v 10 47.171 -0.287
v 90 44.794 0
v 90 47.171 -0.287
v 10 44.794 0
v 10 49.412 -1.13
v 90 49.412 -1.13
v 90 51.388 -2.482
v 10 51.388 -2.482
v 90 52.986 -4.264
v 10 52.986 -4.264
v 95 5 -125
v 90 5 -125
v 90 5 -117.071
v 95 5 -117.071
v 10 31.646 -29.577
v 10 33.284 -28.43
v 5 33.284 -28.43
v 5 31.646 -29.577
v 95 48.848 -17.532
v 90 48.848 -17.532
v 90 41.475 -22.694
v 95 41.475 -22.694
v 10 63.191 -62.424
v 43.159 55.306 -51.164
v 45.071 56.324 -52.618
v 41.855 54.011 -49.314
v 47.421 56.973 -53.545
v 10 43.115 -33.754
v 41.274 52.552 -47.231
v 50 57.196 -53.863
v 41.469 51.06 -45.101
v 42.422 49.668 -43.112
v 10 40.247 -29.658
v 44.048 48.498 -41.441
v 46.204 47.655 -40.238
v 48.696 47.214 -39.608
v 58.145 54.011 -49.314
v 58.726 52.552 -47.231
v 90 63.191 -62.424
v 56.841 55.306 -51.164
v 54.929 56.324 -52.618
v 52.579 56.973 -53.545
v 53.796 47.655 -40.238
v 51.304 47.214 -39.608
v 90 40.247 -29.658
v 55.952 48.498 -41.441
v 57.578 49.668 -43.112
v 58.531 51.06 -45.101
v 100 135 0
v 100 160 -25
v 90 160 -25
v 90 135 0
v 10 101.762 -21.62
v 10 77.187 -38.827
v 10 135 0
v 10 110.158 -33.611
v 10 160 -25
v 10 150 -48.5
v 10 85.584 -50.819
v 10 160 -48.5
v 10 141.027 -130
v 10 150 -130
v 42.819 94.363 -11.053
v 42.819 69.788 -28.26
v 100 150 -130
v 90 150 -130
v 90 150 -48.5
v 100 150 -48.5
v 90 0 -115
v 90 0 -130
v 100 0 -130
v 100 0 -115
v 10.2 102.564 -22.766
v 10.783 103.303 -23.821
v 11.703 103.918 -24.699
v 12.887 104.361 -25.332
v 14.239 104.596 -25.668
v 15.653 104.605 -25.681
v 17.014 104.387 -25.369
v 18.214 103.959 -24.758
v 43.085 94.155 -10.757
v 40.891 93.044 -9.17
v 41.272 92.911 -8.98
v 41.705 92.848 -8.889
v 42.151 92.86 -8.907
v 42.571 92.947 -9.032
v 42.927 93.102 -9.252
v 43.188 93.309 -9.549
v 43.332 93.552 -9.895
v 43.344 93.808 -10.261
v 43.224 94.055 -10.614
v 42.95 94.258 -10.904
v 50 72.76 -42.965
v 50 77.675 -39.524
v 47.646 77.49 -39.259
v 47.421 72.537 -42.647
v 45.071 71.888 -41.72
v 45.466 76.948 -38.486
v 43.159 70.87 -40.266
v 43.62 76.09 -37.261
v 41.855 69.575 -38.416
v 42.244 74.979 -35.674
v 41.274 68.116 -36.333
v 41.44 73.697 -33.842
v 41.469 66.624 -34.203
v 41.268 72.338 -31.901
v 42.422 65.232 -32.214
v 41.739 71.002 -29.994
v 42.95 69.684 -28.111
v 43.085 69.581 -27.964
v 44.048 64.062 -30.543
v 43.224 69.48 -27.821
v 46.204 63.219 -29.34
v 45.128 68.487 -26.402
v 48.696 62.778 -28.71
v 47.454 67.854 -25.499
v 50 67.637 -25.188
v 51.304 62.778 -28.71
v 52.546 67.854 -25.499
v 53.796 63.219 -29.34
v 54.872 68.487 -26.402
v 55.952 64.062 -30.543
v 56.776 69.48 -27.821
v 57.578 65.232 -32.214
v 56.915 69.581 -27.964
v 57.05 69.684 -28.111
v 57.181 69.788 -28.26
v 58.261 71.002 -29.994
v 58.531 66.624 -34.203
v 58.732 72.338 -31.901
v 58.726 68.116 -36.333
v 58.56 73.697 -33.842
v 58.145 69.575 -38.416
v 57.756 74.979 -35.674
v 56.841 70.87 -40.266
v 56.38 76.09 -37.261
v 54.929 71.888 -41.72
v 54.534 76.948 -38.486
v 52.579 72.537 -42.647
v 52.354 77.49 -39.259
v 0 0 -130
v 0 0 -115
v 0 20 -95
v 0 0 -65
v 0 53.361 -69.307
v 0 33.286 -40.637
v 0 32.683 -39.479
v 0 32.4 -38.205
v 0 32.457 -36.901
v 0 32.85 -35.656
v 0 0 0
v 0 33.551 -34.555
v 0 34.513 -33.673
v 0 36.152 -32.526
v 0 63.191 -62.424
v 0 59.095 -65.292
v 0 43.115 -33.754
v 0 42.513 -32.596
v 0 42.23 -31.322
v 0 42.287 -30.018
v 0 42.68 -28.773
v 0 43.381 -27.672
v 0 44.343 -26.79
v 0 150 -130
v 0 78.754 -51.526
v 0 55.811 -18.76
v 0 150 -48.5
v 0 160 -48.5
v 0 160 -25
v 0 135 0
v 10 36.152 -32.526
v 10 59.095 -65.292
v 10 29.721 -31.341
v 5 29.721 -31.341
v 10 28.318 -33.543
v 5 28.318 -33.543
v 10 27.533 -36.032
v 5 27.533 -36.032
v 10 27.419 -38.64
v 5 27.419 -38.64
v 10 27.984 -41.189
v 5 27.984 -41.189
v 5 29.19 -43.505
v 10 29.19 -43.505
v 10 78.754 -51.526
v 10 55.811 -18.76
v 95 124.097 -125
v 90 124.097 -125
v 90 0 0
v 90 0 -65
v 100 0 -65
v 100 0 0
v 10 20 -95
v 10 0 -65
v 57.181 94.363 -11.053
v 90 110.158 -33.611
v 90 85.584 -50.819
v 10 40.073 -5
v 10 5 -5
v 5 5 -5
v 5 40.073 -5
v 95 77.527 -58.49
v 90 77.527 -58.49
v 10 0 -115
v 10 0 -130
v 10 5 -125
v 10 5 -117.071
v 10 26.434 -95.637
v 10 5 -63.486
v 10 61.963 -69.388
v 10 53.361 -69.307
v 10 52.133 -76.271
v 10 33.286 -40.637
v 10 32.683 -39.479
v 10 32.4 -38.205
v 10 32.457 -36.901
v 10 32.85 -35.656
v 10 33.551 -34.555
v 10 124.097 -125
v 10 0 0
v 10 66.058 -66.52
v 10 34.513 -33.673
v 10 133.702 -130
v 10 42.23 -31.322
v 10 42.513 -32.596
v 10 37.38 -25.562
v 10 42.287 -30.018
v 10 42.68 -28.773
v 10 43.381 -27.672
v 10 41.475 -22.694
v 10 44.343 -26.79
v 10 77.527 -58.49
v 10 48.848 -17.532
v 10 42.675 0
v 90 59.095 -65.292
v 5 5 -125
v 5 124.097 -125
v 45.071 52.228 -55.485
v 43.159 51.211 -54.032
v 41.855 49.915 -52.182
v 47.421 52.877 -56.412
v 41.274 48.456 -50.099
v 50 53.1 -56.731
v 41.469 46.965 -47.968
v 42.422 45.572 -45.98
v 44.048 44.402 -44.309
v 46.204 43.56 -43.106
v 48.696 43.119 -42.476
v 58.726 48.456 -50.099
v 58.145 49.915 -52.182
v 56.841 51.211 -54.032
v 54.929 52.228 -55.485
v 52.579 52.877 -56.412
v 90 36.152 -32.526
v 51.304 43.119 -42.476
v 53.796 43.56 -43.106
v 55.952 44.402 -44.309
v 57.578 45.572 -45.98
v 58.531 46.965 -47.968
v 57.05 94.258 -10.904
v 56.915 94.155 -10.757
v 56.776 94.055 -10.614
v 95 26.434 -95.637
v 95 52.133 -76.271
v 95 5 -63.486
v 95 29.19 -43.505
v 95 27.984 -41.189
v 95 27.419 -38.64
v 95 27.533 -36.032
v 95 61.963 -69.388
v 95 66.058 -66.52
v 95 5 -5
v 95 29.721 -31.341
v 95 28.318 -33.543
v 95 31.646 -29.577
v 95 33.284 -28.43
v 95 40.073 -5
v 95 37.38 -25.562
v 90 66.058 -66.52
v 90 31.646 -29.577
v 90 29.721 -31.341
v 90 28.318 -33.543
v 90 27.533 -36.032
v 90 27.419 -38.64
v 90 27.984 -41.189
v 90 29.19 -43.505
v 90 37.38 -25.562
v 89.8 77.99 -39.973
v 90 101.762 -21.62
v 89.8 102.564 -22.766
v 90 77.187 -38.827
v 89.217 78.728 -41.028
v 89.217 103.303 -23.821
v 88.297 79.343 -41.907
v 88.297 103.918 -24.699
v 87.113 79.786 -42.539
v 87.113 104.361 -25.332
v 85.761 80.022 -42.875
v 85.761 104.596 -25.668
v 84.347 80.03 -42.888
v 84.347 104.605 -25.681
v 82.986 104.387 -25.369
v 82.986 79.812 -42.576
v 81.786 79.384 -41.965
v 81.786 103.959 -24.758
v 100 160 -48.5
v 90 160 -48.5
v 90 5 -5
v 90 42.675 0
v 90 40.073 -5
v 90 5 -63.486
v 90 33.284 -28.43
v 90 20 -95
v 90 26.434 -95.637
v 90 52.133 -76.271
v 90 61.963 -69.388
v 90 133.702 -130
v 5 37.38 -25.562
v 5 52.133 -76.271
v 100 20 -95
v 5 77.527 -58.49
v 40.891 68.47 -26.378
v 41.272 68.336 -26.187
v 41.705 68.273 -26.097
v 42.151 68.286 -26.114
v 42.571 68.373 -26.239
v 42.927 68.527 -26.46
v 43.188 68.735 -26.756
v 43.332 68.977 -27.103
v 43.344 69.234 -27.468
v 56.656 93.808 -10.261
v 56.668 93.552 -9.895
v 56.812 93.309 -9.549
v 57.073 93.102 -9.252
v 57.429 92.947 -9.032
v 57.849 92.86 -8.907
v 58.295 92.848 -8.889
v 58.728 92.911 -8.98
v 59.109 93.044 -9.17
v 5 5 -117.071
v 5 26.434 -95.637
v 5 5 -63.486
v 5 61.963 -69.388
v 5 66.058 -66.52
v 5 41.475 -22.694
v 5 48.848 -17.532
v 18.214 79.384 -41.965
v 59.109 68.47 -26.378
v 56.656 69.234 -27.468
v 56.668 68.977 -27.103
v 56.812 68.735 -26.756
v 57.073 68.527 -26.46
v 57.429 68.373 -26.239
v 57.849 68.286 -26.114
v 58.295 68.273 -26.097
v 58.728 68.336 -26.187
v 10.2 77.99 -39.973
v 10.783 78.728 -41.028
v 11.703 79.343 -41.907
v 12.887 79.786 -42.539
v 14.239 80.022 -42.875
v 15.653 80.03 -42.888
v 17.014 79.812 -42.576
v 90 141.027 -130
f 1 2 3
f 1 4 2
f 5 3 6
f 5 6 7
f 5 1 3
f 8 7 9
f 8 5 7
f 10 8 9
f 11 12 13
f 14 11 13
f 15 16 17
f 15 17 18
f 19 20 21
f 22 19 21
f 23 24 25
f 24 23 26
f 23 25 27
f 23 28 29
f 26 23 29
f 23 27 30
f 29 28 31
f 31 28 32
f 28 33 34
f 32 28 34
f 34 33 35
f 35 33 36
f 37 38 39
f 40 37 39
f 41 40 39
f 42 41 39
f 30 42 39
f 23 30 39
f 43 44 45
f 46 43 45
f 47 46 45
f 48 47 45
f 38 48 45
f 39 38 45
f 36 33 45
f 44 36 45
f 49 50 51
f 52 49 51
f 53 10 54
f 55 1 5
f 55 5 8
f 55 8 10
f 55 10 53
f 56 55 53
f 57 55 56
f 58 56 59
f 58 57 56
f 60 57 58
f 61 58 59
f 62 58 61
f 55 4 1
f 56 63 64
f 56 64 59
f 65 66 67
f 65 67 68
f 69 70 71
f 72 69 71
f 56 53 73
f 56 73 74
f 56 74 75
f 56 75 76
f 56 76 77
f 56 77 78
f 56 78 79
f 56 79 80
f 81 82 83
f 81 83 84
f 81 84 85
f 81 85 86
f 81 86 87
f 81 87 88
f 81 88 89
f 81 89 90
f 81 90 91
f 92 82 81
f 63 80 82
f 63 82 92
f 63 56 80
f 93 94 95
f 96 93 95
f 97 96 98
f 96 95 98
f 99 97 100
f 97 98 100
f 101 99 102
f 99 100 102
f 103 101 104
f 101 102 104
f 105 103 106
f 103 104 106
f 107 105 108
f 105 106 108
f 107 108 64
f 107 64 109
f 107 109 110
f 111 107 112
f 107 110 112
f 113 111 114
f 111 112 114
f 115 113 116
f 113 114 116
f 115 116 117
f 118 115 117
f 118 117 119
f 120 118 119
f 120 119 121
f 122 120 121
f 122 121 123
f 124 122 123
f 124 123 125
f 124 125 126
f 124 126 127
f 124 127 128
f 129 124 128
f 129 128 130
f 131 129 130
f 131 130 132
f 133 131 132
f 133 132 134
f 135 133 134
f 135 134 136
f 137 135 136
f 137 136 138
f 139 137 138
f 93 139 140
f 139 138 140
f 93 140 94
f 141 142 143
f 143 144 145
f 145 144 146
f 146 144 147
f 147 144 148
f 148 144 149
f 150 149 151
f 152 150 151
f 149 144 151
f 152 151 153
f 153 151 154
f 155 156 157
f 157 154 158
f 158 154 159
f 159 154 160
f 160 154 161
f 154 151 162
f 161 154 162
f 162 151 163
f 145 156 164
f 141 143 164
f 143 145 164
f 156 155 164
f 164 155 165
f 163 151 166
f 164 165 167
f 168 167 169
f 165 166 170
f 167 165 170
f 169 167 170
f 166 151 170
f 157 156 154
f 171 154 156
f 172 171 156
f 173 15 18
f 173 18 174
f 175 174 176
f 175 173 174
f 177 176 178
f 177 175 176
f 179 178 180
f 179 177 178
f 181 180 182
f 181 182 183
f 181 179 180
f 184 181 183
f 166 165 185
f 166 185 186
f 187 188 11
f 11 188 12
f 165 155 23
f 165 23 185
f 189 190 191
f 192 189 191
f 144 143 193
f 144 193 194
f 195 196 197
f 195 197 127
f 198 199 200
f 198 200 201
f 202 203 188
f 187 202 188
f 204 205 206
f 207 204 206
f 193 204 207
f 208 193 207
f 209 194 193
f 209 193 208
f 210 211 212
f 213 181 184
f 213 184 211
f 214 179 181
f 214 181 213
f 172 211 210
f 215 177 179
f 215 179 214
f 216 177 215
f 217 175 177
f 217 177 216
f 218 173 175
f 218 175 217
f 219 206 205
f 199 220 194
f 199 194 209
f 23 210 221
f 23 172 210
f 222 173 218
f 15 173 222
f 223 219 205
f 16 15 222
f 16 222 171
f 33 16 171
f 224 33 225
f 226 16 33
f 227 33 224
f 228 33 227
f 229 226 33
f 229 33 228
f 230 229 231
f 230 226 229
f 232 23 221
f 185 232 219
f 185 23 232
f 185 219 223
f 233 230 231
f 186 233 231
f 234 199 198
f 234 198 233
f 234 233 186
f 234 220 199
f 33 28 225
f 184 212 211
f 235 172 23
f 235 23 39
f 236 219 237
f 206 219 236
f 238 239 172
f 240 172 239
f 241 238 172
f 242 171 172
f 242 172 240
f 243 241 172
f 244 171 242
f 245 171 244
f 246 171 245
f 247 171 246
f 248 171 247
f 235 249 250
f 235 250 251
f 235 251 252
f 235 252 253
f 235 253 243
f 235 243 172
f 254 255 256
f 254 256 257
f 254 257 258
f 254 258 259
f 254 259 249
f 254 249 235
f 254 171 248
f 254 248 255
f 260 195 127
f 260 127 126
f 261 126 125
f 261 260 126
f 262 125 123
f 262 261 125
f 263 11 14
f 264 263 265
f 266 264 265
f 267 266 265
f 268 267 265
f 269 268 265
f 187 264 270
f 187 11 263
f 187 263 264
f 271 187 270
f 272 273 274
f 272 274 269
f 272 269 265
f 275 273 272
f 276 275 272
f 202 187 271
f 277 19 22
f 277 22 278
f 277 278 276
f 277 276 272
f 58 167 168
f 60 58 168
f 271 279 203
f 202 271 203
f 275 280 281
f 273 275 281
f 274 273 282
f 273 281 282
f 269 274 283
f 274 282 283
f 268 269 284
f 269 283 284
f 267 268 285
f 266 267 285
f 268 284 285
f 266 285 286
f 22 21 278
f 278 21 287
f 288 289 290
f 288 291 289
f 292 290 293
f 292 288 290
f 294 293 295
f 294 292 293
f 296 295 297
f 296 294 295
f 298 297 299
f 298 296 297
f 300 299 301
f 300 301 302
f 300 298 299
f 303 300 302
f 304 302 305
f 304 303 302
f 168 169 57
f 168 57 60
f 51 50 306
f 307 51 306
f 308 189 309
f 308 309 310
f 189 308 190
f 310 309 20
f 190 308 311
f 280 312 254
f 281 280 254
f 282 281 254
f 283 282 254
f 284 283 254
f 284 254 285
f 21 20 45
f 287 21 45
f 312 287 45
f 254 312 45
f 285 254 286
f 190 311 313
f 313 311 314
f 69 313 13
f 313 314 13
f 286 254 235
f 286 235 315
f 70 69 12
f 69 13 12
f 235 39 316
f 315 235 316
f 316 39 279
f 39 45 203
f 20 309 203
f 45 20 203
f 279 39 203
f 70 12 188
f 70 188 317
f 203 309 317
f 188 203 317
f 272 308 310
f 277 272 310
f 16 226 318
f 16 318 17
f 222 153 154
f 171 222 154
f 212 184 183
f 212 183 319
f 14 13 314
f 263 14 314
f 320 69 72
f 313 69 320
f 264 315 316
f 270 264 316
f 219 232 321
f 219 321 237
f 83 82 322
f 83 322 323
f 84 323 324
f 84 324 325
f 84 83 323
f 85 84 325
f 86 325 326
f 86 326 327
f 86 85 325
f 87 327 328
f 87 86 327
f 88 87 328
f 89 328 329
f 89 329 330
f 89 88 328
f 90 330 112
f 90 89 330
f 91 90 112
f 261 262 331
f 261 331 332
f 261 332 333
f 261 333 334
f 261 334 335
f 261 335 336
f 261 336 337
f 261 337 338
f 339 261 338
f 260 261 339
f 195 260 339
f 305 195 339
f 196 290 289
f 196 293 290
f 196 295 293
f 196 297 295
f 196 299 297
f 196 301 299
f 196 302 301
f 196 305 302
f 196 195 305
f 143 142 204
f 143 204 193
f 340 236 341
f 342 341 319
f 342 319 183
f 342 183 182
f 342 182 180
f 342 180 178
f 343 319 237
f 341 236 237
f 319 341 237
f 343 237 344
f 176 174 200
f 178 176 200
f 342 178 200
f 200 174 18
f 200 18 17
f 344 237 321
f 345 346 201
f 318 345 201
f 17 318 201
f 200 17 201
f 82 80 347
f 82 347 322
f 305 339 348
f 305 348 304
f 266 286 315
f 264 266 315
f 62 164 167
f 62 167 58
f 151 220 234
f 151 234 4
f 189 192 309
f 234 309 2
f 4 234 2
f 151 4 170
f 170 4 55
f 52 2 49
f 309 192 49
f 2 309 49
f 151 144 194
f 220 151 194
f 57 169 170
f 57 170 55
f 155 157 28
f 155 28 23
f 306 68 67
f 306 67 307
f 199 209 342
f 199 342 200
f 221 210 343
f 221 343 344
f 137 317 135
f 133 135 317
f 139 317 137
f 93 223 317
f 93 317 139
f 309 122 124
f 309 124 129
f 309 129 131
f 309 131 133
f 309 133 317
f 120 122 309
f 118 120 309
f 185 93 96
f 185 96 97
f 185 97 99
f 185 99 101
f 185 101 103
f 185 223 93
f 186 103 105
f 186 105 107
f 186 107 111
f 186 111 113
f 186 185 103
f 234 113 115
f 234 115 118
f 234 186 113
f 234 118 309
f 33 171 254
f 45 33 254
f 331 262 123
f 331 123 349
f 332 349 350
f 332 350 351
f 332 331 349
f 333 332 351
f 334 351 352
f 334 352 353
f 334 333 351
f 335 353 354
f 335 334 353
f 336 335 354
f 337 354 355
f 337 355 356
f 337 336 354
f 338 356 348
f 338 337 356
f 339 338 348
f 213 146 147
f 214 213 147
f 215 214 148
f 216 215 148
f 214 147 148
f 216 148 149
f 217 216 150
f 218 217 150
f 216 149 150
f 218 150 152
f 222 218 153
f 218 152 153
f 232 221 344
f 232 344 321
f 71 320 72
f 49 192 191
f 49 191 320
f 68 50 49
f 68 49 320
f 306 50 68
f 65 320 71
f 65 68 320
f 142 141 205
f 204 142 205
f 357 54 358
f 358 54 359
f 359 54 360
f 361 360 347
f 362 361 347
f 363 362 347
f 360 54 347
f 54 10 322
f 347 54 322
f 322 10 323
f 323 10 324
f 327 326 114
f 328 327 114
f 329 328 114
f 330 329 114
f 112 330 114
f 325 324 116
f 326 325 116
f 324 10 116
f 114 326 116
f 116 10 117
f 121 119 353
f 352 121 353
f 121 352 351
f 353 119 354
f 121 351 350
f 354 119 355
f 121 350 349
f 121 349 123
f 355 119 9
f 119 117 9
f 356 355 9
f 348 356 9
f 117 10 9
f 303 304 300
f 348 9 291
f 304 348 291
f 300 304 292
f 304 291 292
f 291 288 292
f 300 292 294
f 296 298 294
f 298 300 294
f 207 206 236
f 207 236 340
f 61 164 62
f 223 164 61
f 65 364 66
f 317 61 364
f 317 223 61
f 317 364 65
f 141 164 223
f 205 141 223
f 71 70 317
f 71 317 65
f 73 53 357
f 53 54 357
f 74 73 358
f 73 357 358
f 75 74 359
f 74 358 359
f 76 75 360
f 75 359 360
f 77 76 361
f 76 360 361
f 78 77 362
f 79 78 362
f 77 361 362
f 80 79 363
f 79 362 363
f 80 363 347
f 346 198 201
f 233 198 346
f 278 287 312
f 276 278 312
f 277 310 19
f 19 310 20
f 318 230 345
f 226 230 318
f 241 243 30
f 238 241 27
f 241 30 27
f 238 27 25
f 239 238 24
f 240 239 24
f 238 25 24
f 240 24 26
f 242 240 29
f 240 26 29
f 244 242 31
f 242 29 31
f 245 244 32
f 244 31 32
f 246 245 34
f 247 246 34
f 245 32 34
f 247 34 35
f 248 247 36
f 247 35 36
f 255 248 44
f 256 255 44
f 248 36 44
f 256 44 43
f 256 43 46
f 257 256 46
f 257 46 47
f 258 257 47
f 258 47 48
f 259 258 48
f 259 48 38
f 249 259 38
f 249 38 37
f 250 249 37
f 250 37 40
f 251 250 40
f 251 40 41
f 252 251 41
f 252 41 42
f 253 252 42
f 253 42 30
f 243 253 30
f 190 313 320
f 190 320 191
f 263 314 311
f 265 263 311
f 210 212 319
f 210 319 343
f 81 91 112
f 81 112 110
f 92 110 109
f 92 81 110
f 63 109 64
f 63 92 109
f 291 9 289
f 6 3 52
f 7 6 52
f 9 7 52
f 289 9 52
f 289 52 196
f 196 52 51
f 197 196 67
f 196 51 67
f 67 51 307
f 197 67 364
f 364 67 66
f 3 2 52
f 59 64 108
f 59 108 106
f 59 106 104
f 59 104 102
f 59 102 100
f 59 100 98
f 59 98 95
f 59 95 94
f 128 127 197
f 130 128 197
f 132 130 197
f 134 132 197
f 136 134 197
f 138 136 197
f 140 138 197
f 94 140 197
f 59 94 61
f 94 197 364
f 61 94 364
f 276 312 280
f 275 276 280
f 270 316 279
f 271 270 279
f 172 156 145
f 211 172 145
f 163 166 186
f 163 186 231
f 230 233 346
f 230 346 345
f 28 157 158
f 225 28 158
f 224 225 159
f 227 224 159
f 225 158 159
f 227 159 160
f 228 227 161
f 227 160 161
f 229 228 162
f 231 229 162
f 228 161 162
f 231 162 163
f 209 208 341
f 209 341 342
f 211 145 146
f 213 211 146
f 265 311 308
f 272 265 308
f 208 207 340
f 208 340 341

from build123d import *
from build123d.topology import SkipClean

# Parameters (mm, degrees)
SKETCH5_W           = 100
SKETCH5_H           = 130
BOSS_EXTRUDE1_DEPTH = 150
CUT_EXTRUDE1_START  = -50
CUT_EXTRUDE1_DEPTH  = 40
BOSS_EXTRUDE3_START = 30
SKETCH17_W          = 80
SKETCH17_H          = 40
BOSS_EXTRUDE3_DEPTH = 5
SKETCH10_R          = 8.75
CUT_EXTRUDE3_DEPTH  = 100
SKETCH18_W          = 48.5
SKETCH18_H          = 10
BOSS_EXTRUDE4_DEPTH = 10
BOSS_EXTRUDE5_START = 100
SKETCH18_2_W        = 48.5
SKETCH18_2_H        = 10
BOSS_EXTRUDE5_DEPTH = 10
CUT_EXTRUDE5_DEPTH  = 70
FILLET1_DEPTH       = 10
CUT_EXTRUDE6_DEPTH  = 120
FILLET2_R           = 10
CHAMFER2_SIZE       = 25
BOSS_EXTRUDE6_START = 30
BOSS_EXTRUDE6_DEPTH = 30
FILLET3_R           = 5
CUT_EXTRUDE7_DEPTH  = 5


with BuildPart() as part:
    # Sketch5 → Boss-Extrude1 (new body)
    with BuildSketch(Plane(origin=(0, 0, 0), x_dir=(1, 0, 0), z_dir=(0, 1, 0))):
        with Locations((50, 65)):
            Rectangle(SKETCH5_W, SKETCH5_H)
    extrude(amount=BOSS_EXTRUDE1_DEPTH)

    # Sketch7 → Cut-Extrude1 (cut, symmetric)
    with BuildSketch(Plane(origin=(100, 0, 0), x_dir=(0, 0, -1), z_dir=(1, 0, 0)).offset(CUT_EXTRUDE1_START)):
        Polygon((130, 0), (130, 133.702332435), (0, 42.675352467), (0, 0), align=None)
        Polygon((0, 50), (130, 141.026979967), (130, 150), (0, 150), align=None)
    extrude(amount=CUT_EXTRUDE1_DEPTH, both=True, mode=Mode.SUBTRACT)

    # Sketch17 → Boss-Extrude3 (add)
    with BuildSketch(Plane(origin=(0, 275.412054826, -321.921776796), x_dir=(1, 0, 0), z_dir=(0, -0.819152044288993, -0.5735764363510444)).offset(BOSS_EXTRUDE3_START)):
        with Locations((50, 354.293228142)):
            Rectangle(SKETCH17_W, SKETCH17_H)
    extrude(amount=-BOSS_EXTRUDE3_DEPTH)

    # Sketch10 → Cut-Extrude3 (cut)
    with BuildSketch(Plane(origin=(0, 33.550503583, 23.49231552), x_dir=(1, 0, 0), z_dir=(0, 0.819152044288993, 0.5735764363510444))):
        with Locations(Location((50, 68.178273127, 0), (0, 0, 90))):
            Circle(SKETCH10_R)
    extrude(amount=-CUT_EXTRUDE3_DEPTH, mode=Mode.SUBTRACT)

    # Sketch18 → Boss-Extrude4 (add)
    with BuildSketch(Plane(origin=(0, 0, 0), x_dir=(0, 0, -1), z_dir=(1, 0, 0))):
        with Locations((24.25, 155)):
            Rectangle(SKETCH18_W, SKETCH18_H)
    extrude(amount=BOSS_EXTRUDE4_DEPTH)

    # Sketch18<2> → Boss-Extrude5 (add)
    with BuildSketch(Plane(origin=(0, 0, 0), x_dir=(0, 0, -1), z_dir=(1, 0, 0)).offset(BOSS_EXTRUDE5_START)):
        with Locations((24.25, 155)):
            Rectangle(SKETCH18_2_W, SKETCH18_2_H)
    extrude(amount=-BOSS_EXTRUDE5_DEPTH)

    # Sketch21 → Cut-Extrude5 (cut)
    with BuildSketch(Plane(origin=(0, 0, 0), x_dir=(0, 0, -1), z_dir=(1, 0, 0))):
        Polygon((62.42420648, 63.190535225), (51.526254189, 78.754424066), (18.760172418, 55.811366612), (29.658124708, 40.247477771), align=None)
        Polygon((69.307123716, 53.360710693), (36.541041945, 30.417653239), (32.52600689, 36.151717549), (65.292088662, 59.094775003), align=None)
    extrude(amount=CUT_EXTRUDE5_DEPTH, mode=Mode.SUBTRACT)

    # Fillet1: read off the stored shape, not the designer's step
    # Fillet1 outline → Fillet1 (add)
    with BuildSketch(Plane.YZ):
        with BuildLine():
            Line((30.417653239, -36.541041945), (33.285535421, -40.636802166))
            ThreePointArc((33.285535421, -40.636802166), (32.457256878, -36.900679096), (34.513413461, -33.673159763))
            Line((34.513413461, -33.673159763), (30.417653239, -36.541041945))
        make_face()
        with BuildLine():
            ThreePointArc((43.115359953, -33.75388493), (42.287081409, -30.01776186), (44.343237992, -26.790242527))
            Line((44.343237992, -26.790242527), (40.247477771, -29.658124708))
            Line((40.247477771, -29.658124708), (43.115359953, -33.75388493))
        make_face()
    extrude(amount=FILLET1_DEPTH)

    # Sketch22 → Cut-Extrude6 (cut)
    with BuildSketch(Plane.ZY):
        Polygon((-115, 0), (-95, 20), (-65, 0), align=None)
    extrude(amount=-CUT_EXTRUDE6_DEPTH, mode=Mode.SUBTRACT)

    # Fillet2
    fillet2_edges = [part.edges().sort_by_distance(p)[0] for p in [
        (50, 50, 0),
    ]]
    fillet(fillet2_edges, radius=FILLET2_R)

    # Chamfer2
    chamfer2_edges = [part.edges().sort_by_distance(p)[0] for p in [
        (5, 160, 0),
        (95, 160, 0),
    ]]
    chamfer(chamfer2_edges, length=CHAMFER2_SIZE)

    # Sketch23 → Boss-Extrude6 (add)
    with SkipClean():  # the faces are left unmerged after this step: merging them gives an invalid solid
        with BuildSketch(Plane(origin=(0, 33.550503583, 23.49231552), x_dir=(1, 0, 0), z_dir=(0, 0.819152044288993, 0.5735764363510444)).offset(BOSS_EXTRUDE6_START)):
            with BuildLine():
                Line((90, 90.716932877), (57.180703308, 63.178273127))
                ThreePointArc((57.180703308, 63.178273127), (56.983337112, 62.906129088), (56.77566264, 62.64176739))
                ThreePointArc((56.77566264, 62.64176739), (57.241088602, 60.832062958), (59.109066137, 60.880139798))
                Line((59.109066137, 60.880139798), (90, 86.800711009))
                Line((90, 86.800711009), (90, 90.716932877))
            make_face()
            with BuildLine():
                ThreePointArc((40.890933863, 60.880139798), (42.758911398, 60.832062958), (43.22433736, 62.64176739))
                ThreePointArc((43.22433736, 62.64176739), (43.016662888, 62.906129088), (42.819296692, 63.178273127))
                Line((42.819296692, 63.178273127), (10, 90.716932877))
                Line((10, 90.716932877), (10, 86.800711009))
                Line((10, 86.800711009), (40.890933863, 60.880139798))
            make_face()
        extrude(amount=-BOSS_EXTRUDE6_DEPTH)

    # Fillet3
    fillet3_edges = [part.edges().sort_by_distance(p)[0] for p in [
        (90, 95.624626741, -39.007017804),
        (10, 95.624626741, -39.007017804),
    ]]
    fillet(fillet3_edges, radius=FILLET3_R)

    # Sketch24 → Cut-Extrude7 (cut)
    with SkipClean():  # the faces are left unmerged after this step: merging them gives an invalid solid
        with BuildSketch(Plane(origin=(10, 0, 0), x_dir=(0, 0, -1), z_dir=(1, 0, 0))):
            with BuildLine():
                ThreePointArc((29.577399541, 31.645531279), (36.032438208, 27.533218113), (43.504684348, 29.1897752))
                Line((43.504684348, 29.1897752), (76.270766119, 52.132832654))
                Line((76.270766119, 52.132832654), (69.387848883, 61.962657185))
                Line((69.387848883, 61.962657185), (66.519966701, 66.058417407))
                Line((66.519966701, 66.058417407), (58.489896592, 77.526546027))
                Line((58.489896592, 77.526546027), (125, 124.0974218))
                Line((125, 124.0974218), (125, 5))
                Line((125, 5), (117.071067812, 5))
                Line((117.071067812, 5), (95.637089412, 26.4339784))
                Line((95.637089412, 26.4339784), (63.486121811, 5))
                Line((63.486121811, 5), (5, 5))
                Line((5, 5), (5, 40.072517215))
                Line((5, 40.072517215), (17.532294378, 48.847724209))
                Line((17.532294378, 48.847724209), (22.694482305, 41.475355811))
                Line((22.694482305, 41.475355811), (25.562364487, 37.379595589))
                Line((25.562364487, 37.379595589), (28.430246669, 33.283835368))
                Line((28.430246669, 33.283835368), (29.577399541, 31.645531279))
            make_face()
        cut_extrude7 = extrude(amount=-CUT_EXTRUDE7_DEPTH, mode=Mode.SUBTRACT)

    # Mirror1: Cut-Extrude7 across plane
    with SkipClean():  # the faces are left unmerged after this step: merging them gives an invalid solid
        add(cut_extrude7.mirror(Plane.ZY.offset(-50)), mode=Mode.SUBTRACT)


solid = part.part
